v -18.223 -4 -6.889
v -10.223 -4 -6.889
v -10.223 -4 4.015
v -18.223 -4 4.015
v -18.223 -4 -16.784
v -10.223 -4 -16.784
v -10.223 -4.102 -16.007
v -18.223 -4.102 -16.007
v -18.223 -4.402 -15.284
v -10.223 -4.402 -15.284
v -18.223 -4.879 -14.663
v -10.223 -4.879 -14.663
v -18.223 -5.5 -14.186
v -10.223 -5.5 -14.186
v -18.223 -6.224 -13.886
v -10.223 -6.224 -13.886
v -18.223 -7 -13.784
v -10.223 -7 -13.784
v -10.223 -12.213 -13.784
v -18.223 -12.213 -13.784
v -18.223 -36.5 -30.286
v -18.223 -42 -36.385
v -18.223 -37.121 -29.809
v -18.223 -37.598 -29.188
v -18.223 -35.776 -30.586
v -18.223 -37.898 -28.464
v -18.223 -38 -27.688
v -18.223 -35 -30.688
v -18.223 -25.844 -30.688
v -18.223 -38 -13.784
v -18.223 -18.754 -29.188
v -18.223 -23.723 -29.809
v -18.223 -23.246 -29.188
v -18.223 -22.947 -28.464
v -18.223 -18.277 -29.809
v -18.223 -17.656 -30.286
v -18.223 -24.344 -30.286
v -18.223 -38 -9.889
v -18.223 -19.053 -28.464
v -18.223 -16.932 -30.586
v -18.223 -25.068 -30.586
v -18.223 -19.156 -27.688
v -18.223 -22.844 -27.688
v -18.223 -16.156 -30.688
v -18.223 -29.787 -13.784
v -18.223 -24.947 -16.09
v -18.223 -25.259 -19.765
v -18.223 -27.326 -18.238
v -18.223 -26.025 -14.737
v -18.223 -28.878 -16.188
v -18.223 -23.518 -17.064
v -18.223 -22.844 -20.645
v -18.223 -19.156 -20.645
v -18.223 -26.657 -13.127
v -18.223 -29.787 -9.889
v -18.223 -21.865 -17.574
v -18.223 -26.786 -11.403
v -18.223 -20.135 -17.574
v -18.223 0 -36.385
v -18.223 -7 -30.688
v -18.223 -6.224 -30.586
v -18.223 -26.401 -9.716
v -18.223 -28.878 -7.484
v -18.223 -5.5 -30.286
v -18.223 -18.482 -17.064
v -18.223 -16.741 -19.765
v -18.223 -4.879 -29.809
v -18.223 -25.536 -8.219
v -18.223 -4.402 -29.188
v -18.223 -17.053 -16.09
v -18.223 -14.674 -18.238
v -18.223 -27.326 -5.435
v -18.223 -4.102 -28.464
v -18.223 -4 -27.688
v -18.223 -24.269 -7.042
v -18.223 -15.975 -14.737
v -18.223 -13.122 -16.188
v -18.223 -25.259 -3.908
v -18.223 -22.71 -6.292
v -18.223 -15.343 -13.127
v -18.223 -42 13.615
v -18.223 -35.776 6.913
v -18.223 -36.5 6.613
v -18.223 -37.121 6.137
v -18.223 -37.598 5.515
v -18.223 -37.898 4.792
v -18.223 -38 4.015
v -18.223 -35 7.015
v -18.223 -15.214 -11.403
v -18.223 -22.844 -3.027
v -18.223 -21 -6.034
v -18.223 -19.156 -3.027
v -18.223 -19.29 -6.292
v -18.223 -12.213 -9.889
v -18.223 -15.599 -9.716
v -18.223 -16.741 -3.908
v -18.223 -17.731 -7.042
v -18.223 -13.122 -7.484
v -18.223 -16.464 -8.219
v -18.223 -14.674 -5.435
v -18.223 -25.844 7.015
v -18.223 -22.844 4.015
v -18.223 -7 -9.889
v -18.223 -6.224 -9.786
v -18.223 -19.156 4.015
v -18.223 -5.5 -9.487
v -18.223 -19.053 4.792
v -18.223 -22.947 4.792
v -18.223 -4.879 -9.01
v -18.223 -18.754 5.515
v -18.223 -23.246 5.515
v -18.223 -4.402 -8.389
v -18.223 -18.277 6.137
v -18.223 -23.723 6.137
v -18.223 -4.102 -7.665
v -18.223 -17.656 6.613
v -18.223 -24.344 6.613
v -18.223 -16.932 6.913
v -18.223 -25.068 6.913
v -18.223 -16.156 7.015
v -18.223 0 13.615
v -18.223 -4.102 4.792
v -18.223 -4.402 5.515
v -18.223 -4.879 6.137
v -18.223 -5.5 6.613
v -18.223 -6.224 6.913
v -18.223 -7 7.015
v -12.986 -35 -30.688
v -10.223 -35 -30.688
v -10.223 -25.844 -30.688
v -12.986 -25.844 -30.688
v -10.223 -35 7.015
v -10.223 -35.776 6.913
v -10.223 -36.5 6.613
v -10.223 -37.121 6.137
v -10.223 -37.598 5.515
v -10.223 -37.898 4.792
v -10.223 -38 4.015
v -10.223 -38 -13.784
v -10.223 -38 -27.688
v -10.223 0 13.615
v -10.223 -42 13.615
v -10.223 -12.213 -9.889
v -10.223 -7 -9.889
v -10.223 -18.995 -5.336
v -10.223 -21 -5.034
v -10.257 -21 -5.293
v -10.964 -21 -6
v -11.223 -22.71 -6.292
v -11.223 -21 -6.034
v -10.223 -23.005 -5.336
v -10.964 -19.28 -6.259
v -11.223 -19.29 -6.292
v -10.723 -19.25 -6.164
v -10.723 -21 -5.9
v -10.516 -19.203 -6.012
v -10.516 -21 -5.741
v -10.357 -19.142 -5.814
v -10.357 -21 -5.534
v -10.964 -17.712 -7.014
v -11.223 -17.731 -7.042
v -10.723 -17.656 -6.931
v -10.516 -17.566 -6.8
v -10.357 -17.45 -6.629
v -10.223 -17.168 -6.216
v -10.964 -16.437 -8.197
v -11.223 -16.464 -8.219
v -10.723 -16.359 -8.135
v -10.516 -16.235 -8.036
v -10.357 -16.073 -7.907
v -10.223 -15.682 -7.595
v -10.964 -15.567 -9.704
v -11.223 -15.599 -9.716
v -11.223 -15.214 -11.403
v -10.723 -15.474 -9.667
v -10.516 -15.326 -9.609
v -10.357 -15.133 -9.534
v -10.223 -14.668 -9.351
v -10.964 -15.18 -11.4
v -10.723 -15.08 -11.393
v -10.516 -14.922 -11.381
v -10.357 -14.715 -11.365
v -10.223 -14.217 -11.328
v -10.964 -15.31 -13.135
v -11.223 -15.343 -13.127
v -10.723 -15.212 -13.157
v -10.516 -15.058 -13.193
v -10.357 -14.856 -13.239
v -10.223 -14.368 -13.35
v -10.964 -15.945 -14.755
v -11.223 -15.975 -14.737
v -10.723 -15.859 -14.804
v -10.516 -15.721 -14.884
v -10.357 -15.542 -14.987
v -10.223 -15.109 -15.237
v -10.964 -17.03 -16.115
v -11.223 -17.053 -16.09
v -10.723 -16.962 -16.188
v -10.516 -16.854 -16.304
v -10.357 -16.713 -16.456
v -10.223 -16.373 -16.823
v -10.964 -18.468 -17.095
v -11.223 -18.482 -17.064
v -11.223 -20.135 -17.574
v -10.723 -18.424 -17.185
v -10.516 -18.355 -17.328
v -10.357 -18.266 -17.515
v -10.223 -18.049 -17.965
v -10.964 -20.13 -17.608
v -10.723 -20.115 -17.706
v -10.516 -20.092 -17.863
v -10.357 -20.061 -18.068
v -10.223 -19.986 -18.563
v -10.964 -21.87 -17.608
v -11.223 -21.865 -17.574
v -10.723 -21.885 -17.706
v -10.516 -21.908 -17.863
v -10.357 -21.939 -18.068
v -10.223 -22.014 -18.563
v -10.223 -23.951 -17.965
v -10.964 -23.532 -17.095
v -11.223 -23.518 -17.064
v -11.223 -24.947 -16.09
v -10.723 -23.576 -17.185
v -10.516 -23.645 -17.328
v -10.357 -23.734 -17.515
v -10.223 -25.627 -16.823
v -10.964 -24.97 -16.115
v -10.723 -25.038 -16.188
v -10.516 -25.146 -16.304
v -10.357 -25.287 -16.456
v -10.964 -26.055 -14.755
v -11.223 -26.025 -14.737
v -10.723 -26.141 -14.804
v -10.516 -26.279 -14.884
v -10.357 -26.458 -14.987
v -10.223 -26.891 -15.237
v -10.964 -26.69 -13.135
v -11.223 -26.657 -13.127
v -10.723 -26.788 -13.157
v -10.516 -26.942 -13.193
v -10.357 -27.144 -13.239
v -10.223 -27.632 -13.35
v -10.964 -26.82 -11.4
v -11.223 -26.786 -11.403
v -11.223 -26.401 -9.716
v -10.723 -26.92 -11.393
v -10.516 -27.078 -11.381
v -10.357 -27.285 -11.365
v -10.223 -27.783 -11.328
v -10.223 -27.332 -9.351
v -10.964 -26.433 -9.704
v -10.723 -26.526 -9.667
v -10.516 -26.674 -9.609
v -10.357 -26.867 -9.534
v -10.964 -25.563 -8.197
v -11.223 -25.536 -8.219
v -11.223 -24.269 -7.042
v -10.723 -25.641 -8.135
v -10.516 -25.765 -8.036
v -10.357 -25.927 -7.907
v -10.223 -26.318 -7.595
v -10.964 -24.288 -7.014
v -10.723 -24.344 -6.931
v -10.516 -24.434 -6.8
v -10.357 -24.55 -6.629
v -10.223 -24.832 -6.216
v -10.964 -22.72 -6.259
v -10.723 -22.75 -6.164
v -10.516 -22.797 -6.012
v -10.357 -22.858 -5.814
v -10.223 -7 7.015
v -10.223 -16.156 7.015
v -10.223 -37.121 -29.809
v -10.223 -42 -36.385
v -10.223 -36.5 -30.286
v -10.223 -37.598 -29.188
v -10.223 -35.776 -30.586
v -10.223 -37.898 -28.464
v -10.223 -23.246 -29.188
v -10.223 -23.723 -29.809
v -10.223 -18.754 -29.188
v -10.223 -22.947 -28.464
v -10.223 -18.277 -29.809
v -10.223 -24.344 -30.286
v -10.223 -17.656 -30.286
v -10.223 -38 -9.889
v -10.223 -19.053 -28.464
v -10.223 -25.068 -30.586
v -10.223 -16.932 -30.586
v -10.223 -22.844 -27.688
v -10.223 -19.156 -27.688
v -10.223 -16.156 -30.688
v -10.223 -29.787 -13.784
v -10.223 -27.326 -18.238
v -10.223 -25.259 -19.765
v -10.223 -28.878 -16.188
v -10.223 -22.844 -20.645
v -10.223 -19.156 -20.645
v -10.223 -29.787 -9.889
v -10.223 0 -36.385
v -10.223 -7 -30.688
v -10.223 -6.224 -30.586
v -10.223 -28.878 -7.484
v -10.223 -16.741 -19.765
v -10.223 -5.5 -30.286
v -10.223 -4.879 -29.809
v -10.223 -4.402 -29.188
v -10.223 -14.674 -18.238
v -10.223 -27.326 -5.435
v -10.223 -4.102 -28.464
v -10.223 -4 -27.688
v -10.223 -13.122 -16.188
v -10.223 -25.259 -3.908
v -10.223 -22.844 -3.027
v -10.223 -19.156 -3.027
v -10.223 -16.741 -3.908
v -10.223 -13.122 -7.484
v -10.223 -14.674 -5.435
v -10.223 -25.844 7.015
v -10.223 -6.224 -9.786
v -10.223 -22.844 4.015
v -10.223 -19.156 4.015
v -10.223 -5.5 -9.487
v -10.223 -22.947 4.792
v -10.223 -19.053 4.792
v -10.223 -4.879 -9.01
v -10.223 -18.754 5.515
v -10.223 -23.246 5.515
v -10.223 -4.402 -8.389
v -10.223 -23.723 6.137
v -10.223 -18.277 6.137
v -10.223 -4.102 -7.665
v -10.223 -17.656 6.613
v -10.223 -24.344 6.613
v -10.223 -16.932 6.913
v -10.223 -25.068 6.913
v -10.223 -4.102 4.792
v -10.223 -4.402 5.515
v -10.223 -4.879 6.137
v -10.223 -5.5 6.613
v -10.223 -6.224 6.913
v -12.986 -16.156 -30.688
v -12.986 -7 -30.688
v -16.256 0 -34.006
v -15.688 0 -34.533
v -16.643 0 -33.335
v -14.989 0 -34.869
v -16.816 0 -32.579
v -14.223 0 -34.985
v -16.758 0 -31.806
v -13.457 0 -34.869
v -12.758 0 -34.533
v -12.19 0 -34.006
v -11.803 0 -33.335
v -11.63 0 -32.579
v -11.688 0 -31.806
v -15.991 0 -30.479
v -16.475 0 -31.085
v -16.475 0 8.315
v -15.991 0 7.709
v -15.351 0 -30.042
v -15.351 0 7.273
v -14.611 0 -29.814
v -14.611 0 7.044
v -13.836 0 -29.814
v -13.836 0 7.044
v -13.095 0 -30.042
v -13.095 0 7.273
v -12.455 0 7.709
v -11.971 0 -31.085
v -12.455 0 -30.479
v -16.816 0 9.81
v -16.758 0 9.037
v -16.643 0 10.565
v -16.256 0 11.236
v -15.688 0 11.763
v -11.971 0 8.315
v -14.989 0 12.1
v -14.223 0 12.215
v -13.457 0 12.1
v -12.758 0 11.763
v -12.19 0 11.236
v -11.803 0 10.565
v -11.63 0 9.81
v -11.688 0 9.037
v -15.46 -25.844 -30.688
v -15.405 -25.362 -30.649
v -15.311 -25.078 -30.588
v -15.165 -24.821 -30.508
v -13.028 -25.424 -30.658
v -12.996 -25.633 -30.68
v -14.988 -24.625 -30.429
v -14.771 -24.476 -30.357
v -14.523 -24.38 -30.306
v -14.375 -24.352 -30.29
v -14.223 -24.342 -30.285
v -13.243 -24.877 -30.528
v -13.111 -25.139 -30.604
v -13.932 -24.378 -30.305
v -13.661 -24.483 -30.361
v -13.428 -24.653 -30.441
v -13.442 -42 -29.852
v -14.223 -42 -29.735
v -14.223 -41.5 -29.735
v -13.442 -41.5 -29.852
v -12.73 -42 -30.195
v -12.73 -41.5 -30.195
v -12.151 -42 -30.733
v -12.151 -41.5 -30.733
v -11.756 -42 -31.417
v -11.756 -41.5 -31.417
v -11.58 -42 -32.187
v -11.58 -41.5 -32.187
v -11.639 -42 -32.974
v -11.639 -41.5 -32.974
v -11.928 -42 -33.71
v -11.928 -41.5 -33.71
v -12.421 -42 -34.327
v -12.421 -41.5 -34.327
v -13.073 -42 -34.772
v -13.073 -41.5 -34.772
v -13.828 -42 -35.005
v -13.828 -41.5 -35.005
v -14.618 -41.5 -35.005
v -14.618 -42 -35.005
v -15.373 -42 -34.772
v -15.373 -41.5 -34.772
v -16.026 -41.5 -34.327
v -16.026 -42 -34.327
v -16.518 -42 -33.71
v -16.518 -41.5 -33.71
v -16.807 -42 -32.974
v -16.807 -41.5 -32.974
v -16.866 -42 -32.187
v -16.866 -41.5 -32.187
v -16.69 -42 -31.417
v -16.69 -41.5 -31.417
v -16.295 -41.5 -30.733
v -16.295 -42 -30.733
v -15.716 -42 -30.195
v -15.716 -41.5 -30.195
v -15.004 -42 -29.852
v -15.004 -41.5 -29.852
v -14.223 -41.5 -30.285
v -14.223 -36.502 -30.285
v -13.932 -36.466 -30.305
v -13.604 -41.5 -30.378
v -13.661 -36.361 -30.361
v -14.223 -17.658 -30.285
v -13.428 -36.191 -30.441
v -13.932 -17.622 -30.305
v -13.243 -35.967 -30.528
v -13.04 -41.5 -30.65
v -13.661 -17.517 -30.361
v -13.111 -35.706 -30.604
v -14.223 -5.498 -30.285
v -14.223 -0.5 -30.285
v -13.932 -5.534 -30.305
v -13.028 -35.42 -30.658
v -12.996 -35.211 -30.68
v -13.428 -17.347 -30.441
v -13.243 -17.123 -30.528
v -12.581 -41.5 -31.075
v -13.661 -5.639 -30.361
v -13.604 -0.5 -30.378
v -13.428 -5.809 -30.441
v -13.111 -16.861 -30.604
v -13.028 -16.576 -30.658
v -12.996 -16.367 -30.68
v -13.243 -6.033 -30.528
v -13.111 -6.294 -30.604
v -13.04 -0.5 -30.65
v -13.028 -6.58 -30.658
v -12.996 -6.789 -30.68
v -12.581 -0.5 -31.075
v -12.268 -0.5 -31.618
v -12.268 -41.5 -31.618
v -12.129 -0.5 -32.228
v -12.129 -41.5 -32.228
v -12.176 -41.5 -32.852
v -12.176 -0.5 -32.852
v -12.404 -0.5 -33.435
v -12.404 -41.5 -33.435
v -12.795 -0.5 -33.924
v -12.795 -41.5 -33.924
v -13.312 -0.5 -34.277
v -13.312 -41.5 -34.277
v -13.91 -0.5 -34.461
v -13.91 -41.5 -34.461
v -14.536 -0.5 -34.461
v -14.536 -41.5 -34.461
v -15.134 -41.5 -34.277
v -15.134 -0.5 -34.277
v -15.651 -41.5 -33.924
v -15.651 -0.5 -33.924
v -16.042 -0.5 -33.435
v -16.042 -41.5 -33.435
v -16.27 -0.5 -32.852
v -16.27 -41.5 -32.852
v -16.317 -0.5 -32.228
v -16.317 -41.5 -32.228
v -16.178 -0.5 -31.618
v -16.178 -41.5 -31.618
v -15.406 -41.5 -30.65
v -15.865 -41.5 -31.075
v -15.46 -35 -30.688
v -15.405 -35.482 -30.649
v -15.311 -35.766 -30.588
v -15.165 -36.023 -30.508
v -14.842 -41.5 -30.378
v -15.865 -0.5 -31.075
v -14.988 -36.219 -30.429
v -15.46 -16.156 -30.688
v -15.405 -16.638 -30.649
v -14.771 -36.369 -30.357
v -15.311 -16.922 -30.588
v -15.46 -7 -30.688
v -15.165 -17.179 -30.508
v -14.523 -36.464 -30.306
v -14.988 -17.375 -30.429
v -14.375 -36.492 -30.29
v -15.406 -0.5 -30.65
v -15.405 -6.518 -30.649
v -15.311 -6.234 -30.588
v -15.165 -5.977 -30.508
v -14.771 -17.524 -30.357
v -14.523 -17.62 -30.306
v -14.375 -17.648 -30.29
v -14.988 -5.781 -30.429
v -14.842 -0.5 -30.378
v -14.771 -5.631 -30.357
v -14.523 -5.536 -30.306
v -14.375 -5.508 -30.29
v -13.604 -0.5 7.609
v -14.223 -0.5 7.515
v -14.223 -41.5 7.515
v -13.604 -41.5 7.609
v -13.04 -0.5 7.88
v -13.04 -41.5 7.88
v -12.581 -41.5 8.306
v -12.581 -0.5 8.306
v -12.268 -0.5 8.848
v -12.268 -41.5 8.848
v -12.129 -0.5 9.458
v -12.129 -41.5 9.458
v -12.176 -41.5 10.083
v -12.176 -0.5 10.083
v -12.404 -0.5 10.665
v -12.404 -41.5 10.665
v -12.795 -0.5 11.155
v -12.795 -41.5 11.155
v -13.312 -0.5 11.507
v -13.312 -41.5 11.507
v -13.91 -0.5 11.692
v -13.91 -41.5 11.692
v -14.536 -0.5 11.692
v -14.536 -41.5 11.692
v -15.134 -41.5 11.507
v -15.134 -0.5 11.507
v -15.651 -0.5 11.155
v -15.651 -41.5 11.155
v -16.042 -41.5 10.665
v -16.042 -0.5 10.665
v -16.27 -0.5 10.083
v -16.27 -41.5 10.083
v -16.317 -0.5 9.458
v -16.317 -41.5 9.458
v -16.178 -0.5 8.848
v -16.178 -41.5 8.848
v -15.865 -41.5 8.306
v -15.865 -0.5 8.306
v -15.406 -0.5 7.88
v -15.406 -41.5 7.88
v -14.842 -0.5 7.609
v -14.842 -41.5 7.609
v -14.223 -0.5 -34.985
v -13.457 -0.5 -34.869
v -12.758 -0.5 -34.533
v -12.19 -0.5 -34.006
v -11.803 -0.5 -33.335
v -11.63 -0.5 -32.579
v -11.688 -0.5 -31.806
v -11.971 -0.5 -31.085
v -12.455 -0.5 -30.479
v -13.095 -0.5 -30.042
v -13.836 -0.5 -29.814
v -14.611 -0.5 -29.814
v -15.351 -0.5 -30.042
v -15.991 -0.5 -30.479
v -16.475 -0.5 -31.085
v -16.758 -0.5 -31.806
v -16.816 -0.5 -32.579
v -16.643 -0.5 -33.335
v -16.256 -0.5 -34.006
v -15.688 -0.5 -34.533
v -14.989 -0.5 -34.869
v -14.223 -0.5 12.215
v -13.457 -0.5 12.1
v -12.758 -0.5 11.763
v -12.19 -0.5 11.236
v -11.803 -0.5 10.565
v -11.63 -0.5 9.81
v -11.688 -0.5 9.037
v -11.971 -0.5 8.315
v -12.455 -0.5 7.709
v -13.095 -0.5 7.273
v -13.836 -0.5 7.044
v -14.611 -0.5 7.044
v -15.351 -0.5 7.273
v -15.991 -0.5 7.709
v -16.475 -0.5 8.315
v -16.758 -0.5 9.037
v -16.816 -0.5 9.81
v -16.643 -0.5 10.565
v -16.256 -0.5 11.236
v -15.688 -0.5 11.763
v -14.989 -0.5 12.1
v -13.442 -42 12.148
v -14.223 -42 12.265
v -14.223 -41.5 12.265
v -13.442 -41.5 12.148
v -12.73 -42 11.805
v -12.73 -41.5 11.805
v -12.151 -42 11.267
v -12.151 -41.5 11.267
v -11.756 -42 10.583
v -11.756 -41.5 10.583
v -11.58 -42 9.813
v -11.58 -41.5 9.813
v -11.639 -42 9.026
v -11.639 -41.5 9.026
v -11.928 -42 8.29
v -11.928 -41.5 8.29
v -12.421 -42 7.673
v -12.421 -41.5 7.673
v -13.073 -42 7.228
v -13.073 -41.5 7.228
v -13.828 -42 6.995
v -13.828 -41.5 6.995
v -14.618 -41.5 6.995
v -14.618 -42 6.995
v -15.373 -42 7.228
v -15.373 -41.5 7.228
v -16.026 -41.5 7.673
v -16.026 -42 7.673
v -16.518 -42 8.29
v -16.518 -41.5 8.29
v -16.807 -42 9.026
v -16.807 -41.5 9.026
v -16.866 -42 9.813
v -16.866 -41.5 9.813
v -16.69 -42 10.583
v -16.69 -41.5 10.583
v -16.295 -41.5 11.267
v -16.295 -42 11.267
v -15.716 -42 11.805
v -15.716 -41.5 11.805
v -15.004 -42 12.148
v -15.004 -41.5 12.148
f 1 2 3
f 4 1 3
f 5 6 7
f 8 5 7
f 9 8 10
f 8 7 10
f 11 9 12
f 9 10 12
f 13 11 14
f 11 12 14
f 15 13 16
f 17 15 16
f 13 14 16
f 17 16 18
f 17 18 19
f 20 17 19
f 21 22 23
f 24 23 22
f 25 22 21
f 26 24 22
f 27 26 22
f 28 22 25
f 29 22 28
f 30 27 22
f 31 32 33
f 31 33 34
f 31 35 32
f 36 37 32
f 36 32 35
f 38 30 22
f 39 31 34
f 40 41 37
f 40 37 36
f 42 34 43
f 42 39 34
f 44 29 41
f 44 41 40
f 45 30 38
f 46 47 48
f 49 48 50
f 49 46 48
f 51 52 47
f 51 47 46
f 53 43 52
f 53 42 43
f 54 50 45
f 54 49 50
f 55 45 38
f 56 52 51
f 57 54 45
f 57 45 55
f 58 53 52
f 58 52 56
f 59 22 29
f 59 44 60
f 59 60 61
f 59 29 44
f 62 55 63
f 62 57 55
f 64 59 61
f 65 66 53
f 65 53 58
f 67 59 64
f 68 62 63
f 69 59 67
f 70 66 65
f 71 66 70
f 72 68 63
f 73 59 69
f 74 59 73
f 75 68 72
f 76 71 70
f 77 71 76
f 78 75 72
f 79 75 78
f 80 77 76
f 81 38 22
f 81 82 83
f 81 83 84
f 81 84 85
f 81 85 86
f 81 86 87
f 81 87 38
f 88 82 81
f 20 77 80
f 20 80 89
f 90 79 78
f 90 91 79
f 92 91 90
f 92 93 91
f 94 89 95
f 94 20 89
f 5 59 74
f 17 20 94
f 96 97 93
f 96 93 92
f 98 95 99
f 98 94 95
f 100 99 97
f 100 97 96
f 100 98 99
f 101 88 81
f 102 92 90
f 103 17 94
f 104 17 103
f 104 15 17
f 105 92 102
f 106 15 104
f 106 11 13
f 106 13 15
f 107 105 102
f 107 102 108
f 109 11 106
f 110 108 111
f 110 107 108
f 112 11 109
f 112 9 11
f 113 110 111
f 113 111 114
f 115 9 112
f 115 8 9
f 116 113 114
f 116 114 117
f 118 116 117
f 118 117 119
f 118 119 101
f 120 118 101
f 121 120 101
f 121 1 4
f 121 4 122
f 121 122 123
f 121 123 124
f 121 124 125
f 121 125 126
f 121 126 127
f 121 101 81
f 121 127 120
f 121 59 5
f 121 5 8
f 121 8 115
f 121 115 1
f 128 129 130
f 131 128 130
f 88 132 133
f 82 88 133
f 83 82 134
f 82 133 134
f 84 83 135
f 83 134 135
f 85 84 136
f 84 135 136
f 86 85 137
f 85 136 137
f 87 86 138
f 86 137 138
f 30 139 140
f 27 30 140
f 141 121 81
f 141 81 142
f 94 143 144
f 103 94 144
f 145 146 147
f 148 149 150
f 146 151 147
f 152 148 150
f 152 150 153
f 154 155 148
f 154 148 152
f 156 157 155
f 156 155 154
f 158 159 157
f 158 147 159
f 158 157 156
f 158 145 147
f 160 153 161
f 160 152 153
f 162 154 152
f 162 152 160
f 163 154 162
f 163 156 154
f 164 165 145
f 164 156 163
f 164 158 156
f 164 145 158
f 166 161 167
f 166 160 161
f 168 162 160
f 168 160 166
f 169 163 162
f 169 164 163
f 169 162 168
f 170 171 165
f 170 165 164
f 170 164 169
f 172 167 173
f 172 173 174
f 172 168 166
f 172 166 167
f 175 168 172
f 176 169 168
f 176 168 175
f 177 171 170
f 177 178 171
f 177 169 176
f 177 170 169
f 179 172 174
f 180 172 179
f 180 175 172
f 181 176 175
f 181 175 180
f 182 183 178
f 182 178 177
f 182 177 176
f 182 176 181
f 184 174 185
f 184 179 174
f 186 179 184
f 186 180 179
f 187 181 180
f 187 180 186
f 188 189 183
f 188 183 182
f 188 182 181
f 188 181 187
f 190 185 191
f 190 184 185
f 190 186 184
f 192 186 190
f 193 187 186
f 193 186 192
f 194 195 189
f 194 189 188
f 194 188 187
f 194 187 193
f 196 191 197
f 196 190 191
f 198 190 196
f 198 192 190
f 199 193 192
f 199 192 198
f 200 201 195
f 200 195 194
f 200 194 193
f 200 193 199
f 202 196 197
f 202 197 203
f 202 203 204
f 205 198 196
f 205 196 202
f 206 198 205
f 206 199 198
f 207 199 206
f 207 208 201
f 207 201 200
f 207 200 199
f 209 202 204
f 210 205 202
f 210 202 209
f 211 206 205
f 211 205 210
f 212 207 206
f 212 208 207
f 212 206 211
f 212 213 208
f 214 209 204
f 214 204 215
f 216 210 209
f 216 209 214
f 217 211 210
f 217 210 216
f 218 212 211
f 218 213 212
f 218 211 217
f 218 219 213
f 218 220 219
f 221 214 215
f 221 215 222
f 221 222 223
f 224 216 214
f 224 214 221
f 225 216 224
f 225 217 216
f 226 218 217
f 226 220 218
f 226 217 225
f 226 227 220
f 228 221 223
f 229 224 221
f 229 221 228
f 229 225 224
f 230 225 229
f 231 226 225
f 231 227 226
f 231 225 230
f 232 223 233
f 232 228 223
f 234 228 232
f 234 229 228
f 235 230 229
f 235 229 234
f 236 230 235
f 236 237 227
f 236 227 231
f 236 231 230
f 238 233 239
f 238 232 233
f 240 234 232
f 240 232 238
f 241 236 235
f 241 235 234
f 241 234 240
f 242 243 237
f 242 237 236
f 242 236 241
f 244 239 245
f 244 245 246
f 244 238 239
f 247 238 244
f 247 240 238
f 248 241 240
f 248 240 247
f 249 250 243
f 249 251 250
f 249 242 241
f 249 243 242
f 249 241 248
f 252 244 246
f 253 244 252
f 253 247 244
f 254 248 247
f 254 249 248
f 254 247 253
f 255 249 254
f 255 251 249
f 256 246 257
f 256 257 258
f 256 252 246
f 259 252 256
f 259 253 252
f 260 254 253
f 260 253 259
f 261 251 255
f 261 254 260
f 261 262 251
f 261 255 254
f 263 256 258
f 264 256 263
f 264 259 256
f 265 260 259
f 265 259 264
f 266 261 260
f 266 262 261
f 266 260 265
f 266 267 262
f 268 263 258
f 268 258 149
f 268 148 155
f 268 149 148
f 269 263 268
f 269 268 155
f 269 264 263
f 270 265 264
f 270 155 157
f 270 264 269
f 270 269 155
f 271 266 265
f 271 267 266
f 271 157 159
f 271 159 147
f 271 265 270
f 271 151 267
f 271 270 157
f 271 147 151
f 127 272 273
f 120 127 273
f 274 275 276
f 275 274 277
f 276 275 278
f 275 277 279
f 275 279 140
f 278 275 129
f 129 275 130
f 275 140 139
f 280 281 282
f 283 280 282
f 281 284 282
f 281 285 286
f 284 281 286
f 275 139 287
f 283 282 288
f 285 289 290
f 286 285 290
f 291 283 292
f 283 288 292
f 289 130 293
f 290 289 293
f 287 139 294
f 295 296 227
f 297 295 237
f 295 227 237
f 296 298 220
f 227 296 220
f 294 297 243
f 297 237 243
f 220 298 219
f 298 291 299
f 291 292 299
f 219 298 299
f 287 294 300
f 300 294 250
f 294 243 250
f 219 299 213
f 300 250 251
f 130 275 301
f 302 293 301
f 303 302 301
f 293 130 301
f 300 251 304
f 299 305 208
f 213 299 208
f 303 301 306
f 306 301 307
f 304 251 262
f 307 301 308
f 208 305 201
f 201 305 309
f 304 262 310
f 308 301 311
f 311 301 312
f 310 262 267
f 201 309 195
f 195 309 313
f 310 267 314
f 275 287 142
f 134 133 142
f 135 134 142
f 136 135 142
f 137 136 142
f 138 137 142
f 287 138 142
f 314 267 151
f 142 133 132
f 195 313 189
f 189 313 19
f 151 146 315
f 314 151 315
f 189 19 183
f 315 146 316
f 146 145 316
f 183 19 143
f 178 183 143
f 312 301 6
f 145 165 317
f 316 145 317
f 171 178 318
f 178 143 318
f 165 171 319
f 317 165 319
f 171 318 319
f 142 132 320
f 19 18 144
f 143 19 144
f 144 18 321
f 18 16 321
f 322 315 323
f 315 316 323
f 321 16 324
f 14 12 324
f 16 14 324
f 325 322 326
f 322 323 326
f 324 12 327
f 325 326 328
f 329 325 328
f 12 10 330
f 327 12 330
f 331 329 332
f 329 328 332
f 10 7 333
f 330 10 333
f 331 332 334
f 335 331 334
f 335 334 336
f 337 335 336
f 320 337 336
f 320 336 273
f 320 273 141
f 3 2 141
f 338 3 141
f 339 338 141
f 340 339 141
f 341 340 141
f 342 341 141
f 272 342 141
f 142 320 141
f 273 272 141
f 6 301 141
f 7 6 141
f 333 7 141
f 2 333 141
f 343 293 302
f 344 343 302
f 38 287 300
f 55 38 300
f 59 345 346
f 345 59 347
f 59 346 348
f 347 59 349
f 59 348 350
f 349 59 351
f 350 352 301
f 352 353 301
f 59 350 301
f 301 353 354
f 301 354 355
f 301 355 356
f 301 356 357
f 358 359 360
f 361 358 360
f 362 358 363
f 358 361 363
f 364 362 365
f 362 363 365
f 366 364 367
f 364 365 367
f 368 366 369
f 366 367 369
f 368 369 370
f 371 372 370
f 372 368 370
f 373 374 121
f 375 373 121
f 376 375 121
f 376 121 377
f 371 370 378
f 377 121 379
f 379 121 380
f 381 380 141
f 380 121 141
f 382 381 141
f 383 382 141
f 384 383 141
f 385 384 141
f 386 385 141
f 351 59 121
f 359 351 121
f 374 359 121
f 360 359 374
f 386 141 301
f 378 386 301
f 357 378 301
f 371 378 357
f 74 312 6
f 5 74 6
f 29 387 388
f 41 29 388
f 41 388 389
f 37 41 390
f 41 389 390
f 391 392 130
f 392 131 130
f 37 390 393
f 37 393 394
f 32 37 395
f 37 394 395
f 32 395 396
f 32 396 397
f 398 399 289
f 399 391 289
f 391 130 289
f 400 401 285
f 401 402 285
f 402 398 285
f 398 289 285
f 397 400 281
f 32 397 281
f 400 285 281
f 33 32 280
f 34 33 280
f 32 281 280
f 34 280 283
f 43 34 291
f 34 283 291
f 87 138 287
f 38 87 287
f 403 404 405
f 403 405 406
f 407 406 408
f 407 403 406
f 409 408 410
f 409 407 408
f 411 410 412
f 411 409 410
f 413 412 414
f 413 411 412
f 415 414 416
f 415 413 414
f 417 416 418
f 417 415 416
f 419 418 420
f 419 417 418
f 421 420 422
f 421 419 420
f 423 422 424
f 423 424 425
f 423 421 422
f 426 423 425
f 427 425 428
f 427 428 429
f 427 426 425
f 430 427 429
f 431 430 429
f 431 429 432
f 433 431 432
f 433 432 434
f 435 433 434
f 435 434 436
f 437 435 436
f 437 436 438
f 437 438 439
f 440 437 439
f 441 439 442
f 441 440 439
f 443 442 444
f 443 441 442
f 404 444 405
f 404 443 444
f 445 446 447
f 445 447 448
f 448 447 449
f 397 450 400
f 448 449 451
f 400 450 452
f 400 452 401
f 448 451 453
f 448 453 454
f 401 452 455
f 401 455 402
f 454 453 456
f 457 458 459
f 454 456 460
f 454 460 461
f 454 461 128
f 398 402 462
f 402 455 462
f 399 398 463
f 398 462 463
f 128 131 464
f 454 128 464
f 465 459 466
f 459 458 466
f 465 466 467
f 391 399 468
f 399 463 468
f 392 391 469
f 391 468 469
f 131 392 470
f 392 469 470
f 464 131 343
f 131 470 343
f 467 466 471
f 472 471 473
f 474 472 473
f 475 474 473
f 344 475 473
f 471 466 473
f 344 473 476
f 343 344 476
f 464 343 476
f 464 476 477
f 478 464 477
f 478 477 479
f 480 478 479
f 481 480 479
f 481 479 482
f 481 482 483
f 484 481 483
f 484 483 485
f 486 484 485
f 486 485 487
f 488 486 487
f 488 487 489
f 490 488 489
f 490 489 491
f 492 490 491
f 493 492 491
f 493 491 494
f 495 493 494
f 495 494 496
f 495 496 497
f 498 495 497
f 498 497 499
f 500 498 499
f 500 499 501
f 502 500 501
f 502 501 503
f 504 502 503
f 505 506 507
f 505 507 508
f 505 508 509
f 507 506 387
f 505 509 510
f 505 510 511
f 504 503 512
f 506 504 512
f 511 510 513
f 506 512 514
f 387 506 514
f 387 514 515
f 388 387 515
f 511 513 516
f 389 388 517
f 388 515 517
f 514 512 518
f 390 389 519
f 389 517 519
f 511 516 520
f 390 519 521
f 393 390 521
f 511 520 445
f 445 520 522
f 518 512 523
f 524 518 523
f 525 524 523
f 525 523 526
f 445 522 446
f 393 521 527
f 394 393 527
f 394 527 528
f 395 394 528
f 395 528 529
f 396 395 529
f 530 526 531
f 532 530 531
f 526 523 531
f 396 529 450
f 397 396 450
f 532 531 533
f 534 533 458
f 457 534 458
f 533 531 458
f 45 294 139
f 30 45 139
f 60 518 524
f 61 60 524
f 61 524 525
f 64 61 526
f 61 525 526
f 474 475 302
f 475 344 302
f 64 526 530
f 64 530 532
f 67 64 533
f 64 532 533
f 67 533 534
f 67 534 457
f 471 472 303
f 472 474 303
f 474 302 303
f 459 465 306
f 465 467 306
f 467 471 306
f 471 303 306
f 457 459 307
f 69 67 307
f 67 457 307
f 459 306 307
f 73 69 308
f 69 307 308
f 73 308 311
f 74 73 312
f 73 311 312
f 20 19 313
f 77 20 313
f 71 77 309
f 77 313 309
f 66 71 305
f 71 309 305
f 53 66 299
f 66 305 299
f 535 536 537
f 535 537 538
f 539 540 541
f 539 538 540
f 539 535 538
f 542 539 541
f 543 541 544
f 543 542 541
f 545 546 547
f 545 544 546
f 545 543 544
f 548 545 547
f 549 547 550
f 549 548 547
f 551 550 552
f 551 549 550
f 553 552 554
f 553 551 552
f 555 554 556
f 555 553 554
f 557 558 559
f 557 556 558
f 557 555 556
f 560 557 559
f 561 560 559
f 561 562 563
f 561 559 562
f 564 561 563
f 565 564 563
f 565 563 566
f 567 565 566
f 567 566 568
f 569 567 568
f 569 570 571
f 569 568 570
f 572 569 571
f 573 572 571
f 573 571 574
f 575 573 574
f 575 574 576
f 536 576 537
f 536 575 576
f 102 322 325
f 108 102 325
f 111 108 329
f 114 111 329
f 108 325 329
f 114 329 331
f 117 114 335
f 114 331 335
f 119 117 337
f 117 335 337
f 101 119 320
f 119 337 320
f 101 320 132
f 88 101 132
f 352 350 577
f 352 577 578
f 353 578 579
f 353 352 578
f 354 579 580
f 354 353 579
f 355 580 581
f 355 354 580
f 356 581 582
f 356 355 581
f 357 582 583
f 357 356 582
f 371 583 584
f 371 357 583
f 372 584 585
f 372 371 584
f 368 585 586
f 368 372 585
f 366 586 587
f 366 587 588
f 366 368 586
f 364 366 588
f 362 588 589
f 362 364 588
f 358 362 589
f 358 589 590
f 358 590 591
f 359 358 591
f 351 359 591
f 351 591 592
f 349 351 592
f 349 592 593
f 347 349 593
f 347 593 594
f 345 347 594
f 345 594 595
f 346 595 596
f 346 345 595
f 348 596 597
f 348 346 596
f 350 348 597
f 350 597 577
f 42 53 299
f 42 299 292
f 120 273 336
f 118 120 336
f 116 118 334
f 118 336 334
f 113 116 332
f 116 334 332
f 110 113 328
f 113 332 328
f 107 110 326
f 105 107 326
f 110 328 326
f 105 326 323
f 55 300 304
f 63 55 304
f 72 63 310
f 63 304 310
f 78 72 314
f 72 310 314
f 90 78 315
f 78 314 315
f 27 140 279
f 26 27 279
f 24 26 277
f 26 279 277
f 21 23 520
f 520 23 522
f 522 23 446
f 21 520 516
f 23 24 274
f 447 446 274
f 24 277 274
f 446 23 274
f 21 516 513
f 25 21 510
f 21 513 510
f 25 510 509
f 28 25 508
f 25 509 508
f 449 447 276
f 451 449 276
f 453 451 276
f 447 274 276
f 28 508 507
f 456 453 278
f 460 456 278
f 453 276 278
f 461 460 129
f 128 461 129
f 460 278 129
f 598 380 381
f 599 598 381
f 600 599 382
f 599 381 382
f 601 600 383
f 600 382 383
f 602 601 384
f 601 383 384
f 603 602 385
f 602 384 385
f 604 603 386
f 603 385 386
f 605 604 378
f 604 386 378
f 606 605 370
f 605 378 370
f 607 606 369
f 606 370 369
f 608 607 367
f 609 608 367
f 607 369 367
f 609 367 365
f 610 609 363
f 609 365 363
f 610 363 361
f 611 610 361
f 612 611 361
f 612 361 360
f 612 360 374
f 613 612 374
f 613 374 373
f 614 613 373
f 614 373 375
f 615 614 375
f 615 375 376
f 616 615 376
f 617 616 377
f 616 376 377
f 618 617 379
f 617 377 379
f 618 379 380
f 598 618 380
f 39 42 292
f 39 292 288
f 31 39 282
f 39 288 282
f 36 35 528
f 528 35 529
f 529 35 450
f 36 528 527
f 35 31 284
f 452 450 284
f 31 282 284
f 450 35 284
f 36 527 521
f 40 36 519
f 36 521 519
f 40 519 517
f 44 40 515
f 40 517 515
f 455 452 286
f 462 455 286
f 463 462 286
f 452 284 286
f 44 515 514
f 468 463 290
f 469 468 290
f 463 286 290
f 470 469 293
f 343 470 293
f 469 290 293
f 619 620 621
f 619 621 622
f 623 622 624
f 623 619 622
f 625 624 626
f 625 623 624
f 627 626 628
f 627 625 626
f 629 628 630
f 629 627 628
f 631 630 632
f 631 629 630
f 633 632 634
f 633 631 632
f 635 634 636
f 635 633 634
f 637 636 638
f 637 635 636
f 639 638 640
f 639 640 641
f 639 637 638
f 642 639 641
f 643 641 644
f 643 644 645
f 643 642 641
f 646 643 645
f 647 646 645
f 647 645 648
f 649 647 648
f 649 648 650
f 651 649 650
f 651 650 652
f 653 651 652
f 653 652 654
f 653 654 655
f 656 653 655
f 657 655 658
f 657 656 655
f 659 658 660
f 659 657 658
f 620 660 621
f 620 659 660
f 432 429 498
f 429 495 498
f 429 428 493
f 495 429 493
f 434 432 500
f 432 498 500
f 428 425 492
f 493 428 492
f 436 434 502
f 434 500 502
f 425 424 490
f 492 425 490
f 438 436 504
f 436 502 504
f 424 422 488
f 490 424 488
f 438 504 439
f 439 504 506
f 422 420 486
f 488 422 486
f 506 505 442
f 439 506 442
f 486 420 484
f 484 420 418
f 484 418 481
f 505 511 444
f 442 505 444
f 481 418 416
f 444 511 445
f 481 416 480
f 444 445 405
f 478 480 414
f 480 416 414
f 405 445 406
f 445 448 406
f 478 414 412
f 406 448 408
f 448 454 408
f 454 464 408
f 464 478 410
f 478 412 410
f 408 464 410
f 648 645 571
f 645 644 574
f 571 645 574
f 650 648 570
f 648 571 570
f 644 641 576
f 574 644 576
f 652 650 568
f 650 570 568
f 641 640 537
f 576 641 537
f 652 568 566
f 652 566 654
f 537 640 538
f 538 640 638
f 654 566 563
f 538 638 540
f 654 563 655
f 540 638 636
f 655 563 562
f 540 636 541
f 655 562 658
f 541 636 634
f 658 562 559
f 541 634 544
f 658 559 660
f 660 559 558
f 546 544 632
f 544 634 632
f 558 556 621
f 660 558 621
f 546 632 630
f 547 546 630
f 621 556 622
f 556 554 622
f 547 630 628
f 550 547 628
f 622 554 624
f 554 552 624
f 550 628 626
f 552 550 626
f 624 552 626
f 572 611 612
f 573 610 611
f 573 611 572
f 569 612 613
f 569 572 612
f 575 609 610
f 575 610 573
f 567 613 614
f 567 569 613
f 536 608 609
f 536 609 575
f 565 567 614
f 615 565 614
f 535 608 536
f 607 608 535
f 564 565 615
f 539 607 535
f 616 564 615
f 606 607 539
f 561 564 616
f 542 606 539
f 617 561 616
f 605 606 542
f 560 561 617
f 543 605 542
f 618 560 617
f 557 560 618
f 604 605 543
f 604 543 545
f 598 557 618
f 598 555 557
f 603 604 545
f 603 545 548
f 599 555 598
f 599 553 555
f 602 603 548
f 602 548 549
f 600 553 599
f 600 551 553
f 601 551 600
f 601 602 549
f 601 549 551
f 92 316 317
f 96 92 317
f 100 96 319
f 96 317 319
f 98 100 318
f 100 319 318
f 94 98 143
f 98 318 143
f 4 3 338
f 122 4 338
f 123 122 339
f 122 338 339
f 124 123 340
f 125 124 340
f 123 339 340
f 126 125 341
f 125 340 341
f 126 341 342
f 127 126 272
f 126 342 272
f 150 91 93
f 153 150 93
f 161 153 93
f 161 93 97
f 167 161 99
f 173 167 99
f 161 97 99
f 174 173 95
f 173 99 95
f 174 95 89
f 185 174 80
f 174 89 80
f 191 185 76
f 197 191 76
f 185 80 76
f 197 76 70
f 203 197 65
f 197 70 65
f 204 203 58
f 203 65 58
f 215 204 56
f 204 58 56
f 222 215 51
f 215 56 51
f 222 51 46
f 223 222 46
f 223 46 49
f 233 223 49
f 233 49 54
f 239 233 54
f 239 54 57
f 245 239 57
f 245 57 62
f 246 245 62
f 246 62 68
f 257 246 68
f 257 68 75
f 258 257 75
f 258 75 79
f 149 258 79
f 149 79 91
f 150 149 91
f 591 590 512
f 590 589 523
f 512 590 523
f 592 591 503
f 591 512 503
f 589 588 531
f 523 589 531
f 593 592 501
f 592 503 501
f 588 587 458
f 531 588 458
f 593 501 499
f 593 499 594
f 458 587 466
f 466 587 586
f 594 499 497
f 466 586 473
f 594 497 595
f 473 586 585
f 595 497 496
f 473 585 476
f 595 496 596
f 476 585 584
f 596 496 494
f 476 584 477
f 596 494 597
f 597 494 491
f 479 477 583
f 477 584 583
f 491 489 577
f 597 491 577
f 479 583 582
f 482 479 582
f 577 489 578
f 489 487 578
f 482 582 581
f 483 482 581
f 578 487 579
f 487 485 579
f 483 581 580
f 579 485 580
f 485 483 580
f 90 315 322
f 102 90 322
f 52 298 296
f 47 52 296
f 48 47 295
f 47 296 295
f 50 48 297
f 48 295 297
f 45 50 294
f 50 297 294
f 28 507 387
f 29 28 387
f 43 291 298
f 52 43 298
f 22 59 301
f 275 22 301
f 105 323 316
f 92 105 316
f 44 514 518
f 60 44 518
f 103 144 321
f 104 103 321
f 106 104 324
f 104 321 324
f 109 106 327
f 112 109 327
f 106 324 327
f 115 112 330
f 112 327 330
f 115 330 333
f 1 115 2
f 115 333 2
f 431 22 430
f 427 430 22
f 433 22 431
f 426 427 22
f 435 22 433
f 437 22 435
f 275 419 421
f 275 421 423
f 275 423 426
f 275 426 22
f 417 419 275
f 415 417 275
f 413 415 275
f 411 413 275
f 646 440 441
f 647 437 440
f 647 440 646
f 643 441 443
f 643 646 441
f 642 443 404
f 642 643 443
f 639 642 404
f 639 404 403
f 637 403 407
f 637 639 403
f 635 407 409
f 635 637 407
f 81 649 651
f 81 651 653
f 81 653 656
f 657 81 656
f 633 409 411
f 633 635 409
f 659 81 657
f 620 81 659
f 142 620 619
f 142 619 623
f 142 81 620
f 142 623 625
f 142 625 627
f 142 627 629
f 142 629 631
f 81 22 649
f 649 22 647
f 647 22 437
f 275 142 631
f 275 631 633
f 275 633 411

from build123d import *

# Parameters (mm, degrees)
SKETCH1_W           = 25
SKETCH1_H           = 50
SKETCH1_R           = 3.4
BOSS_EXTRUDE1_DEPTH = 3
SKETCH2_W           = 50
SKETCH2_H           = 3
BOSS_EXTRUDE2_DEPTH = 8
SKETCH3_W           = 8
SKETCH3_H           = 50
BOSS_EXTRUDE3_DEPTH = 42
SKETCH4_R           = 2.65
CUT_EXTRUDE1_DEPTH  = 0.5
SKETCH5_R           = 5.802370205
CUT_EXTRUDE2_DEPTH  = 9
FILLET2_R           = 1
SKETCH6_R           = 12.6
BOSS_EXTRUDE4_DEPTH = 2
FILLET4_R           = 1
SKETCH8_R           = 1.589780168
SKETCH8_R_2         = 1.777428262
CUT_EXTRUDE3_DEPTH  = 10
SKETCH9_W           = 49.021678163
SKETCH9_H           = 20.976854622
CUT_EXTRUDE4_DEPTH  = 68.79439129
SKETCH11_R          = 2.1
CUT_EXTRUDE5_DEPTH  = 59.480168703
SKETCH14_R          = 2.6
CUT_EXTRUDE6_DEPTH  = 0.5
CUT_EXTRUDE7_DEPTH  = 10


with BuildPart() as part:
    # Sketch1 → Boss-Extrude1 (new body)
    with BuildSketch(Plane(origin=(0, 0, 0), x_dir=(1, 0, 0), z_dir=(0, 1, 0))):
        with Locations((2.276951673, 11.384758364)):
            Rectangle(SKETCH1_W, SKETCH1_H)
        with Locations(Location((1.276951673, 11.384758364, 0), (0, 0, 270))):
            Circle(SKETCH1_R, mode=Mode.SUBTRACT)
    extrude(amount=BOSS_EXTRUDE1_DEPTH)

    # Sketch2 → Boss-Extrude2 (add)
    with BuildSketch(Plane.ZY.offset(10.223048327)):
        with Locations((-11.384758364, 1.5)):
            Rectangle(SKETCH2_W, SKETCH2_H)
    extrude(amount=BOSS_EXTRUDE2_DEPTH)

    # Sketch3 → Boss-Extrude3 (add)
    with BuildSketch(Plane.XZ):
        with Locations((-14.223048327, -11.384758364)):
            Rectangle(SKETCH3_W, SKETCH3_H)
    extrude(amount=BOSS_EXTRUDE3_DEPTH)

    # Sketch4 → Cut-Extrude1 (cut)
    with BuildSketch(Plane(origin=(0, 3, 0), x_dir=(1, 0, 0), z_dir=(0, 1, 0))):
        with Locations(Location((-14.223048327, 32.384758364, 0), (0, 0, 270))):
            Circle(SKETCH4_R)
        with Locations(Location((-14.223048327, -9.615241636, 0), (0, 0, 270))):
            Circle(SKETCH4_R)
    cut_extrude1 = extrude(amount=-CUT_EXTRUDE1_DEPTH, mode=Mode.SUBTRACT)

    # Mirror1: Cut-Extrude1 across plane
    add(cut_extrude1.mirror(Plane.ZX.offset(-19.5)), mode=Mode.SUBTRACT)

    # Sketch5 → Cut-Extrude2 (cut)
    with BuildSketch(Plane.ZY.offset(18.223048327)):
        with Locations((-11.836279124, -21)):
            Circle(SKETCH5_R)
    extrude(amount=-CUT_EXTRUDE2_DEPTH, mode=Mode.SUBTRACT)

    # Fillet2
    fillet2_edges = [part.edges().sort_by_distance(p)[0] for p in [
        (-10.223048327, -21, -17.638649329),
    ]]
    fillet(fillet2_edges, radius=FILLET2_R)

    # Mirror2: Cut-Extrude1 across plane
    add(cut_extrude1.mirror(Plane.ZY.offset(1.723048327)), mode=Mode.SUBTRACT)

    # Sketch6 → Boss-Extrude4 (add)
    with BuildSketch(Plane(origin=(0, 3, 0), x_dir=(1, 0, 0), z_dir=(0, 1, 0))):
        with BuildLine():
            Line((14.776951673, 5.825082115), (14.776951673, 16.944434614))
            ThreePointArc((14.776951673, 16.944434614), (-13.323048327, 11.384758364), (14.776951673, 5.825082115))
        make_face()
        with Locations(Location((1.276951673, 11.384758364, 0), (0, 0, 270))):
            Circle(SKETCH6_R, mode=Mode.SUBTRACT)
    extrude(amount=BOSS_EXTRUDE4_DEPTH)

    # Fillet4
    # the kernel refuses this fillet: 1 mm, written as the material it takes off along each edge
    with BuildSketch(Plane(origin=(14.776951673, 5, -3.325082115), x_dir=(0, -1, 0), z_dir=(0, 0, -1))) as fillet4_piece_1:
        with BuildLine():
            CenterArc((FILLET4_R, FILLET4_R), FILLET4_R, 180, 90)
            Line((0, FILLET4_R), (0, 0))
            Line((0, 0), (FILLET4_R, 0))
        make_face()
    extrude(amount=16.119352499, mode=Mode.SUBTRACT)

    # Sketch8 → Cut-Extrude3 (cut)
    with BuildSketch(Plane(origin=(0, 3, 0), x_dir=(1, 0, 0), z_dir=(0, 1, 0))):
        with Locations(Location((1.276951673, 19.884758364, 0), (0, 0, 270))):
            Circle(SKETCH8_R)
        with Locations(Location((1.276951673, 2.884758364, 0), (0, 0, 270))):
            Circle(SKETCH8_R_2)
    extrude(amount=-CUT_EXTRUDE3_DEPTH, mode=Mode.SUBTRACT)

    # Sketch9 → Cut-Extrude4 (cut, through all)
    with BuildSketch(Plane.XY.offset(13.615241636)):
        with Locations((-9.733887409, 10.488427311)):
            Rectangle(SKETCH9_W, SKETCH9_H)
    extrude(amount=-CUT_EXTRUDE4_DEPTH, mode=Mode.SUBTRACT)

    # Sketch11 → Cut-Extrude5 (cut, through all)
    with BuildSketch(Plane(origin=(0, 0, 0), x_dir=(1, 0, 0), z_dir=(0, 1, 0))):
        with Locations(Location((-14.223048327, 32.384758364, 0), (0, 0, 270))):
            Circle(SKETCH11_R)
    cut_extrude5 = extrude(amount=-CUT_EXTRUDE5_DEPTH, mode=Mode.SUBTRACT)

    # Mirror3: Cut-Extrude5 across plane
    add(cut_extrude5.mirror(Plane.XY.offset(-11.384758364)), mode=Mode.SUBTRACT)

    # Sketch14 → Cut-Extrude6 (cut)
    with BuildSketch(Plane(origin=(0, 0, 0), x_dir=(1, 0, 0), z_dir=(0, 1, 0))):
        with Locations(Location((-14.223048327, -9.615241636, 0), (0, 0, 270))):
            Circle(SKETCH14_R)
    cut_extrude6 = extrude(amount=-CUT_EXTRUDE6_DEPTH, mode=Mode.SUBTRACT)

    # Mirror4: Cut-Extrude6 across plane
    add(cut_extrude6.mirror(Plane.XY.offset(-11.384758364)), mode=Mode.SUBTRACT)

    # Sketch15 → Cut-Extrude7 (cut)
    with BuildSketch(Plane(origin=(-10.223048327, 0, 0), x_dir=(0, 0, -1), z_dir=(1, 0, 0))):
        with BuildLine():
            ThreePointArc((-4.015241636, -4), (-6.136561979, -4.878679656), (-7.015241636, -7))
            Line((-7.015241636, -7), (-7.015241636, -16.15570602))
            ThreePointArc((-7.015241636, -16.15570602), (-6.136561979, -18.277026364), (-4.015241636, -19.15570602))
            Line((-4.015241636, -19.15570602), (3.027273521, -19.15570602))
            ThreePointArc((3.027273521, -19.15570602), (5.435051506, -14.673525074), (9.888641359, -12.213265275))
            Line((9.888641359, -12.213265275), (9.888641359, -7))
            ThreePointArc((9.888641359, -7), (9.009961702, -4.878679656), (6.888641359, -4))
            Line((6.888641359, -4), (-4.015241636, -4))
        make_face()
        with BuildLine():
            Line((13.783916889, -7), (13.783916889, -12.213265275))
            ThreePointArc((13.783916889, -12.213265275), (18.237506742, -14.673525074), (20.645284727, -19.15570602))
            Line((20.645284727, -19.15570602), (27.687799884, -19.15570602))
            ThreePointArc((27.687799884, -19.15570602), (29.809120227, -18.277026364), (30.687799884, -16.15570602))
            Line((30.687799884, -16.15570602), (30.687799884, -7))
            ThreePointArc((30.687799884, -7), (29.809120227, -4.878679656), (27.687799884, -4))
            Line((27.687799884, -4), (16.783916889, -4))
            ThreePointArc((16.783916889, -4), (14.662596546, -4.878679656), (13.783916889, -7))
        make_face()
        with BuildLine():
            ThreePointArc((20.645284727, -22.84429398), (18.237506742, -27.326474926), (13.783916889, -29.786734725))
            Line((13.783916889, -29.786734725), (13.783916889, -38))
            Line((13.783916889, -38), (27.687799884, -38))
            ThreePointArc((27.687799884, -38), (29.809120227, -37.121320344), (30.687799884, -35))
            Line((30.687799884, -35), (30.687799884, -25.84429398))
            ThreePointArc((30.687799884, -25.84429398), (29.809120227, -23.722973636), (27.687799884, -22.84429398))
            Line((27.687799884, -22.84429398), (20.645284727, -22.84429398))
        make_face()
        with BuildLine():
            ThreePointArc((9.888641359, -29.786734725), (5.435051506, -27.326474926), (3.027273521, -22.84429398))
            Line((3.027273521, -22.84429398), (-4.015241636, -22.84429398))
            ThreePointArc((-4.015241636, -22.84429398), (-6.136561979, -23.722973636), (-7.015241636, -25.84429398))
            Line((-7.015241636, -25.84429398), (-7.015241636, -35))
            ThreePointArc((-7.015241636, -35), (-6.136561979, -37.121320344), (-4.015241636, -38))
            Line((-4.015241636, -38), (9.888641359, -38))
            Line((9.888641359, -38), (9.888641359, -29.786734725))
        make_face()
    extrude(amount=-CUT_EXTRUDE7_DEPTH, mode=Mode.SUBTRACT)


solid = part.part
